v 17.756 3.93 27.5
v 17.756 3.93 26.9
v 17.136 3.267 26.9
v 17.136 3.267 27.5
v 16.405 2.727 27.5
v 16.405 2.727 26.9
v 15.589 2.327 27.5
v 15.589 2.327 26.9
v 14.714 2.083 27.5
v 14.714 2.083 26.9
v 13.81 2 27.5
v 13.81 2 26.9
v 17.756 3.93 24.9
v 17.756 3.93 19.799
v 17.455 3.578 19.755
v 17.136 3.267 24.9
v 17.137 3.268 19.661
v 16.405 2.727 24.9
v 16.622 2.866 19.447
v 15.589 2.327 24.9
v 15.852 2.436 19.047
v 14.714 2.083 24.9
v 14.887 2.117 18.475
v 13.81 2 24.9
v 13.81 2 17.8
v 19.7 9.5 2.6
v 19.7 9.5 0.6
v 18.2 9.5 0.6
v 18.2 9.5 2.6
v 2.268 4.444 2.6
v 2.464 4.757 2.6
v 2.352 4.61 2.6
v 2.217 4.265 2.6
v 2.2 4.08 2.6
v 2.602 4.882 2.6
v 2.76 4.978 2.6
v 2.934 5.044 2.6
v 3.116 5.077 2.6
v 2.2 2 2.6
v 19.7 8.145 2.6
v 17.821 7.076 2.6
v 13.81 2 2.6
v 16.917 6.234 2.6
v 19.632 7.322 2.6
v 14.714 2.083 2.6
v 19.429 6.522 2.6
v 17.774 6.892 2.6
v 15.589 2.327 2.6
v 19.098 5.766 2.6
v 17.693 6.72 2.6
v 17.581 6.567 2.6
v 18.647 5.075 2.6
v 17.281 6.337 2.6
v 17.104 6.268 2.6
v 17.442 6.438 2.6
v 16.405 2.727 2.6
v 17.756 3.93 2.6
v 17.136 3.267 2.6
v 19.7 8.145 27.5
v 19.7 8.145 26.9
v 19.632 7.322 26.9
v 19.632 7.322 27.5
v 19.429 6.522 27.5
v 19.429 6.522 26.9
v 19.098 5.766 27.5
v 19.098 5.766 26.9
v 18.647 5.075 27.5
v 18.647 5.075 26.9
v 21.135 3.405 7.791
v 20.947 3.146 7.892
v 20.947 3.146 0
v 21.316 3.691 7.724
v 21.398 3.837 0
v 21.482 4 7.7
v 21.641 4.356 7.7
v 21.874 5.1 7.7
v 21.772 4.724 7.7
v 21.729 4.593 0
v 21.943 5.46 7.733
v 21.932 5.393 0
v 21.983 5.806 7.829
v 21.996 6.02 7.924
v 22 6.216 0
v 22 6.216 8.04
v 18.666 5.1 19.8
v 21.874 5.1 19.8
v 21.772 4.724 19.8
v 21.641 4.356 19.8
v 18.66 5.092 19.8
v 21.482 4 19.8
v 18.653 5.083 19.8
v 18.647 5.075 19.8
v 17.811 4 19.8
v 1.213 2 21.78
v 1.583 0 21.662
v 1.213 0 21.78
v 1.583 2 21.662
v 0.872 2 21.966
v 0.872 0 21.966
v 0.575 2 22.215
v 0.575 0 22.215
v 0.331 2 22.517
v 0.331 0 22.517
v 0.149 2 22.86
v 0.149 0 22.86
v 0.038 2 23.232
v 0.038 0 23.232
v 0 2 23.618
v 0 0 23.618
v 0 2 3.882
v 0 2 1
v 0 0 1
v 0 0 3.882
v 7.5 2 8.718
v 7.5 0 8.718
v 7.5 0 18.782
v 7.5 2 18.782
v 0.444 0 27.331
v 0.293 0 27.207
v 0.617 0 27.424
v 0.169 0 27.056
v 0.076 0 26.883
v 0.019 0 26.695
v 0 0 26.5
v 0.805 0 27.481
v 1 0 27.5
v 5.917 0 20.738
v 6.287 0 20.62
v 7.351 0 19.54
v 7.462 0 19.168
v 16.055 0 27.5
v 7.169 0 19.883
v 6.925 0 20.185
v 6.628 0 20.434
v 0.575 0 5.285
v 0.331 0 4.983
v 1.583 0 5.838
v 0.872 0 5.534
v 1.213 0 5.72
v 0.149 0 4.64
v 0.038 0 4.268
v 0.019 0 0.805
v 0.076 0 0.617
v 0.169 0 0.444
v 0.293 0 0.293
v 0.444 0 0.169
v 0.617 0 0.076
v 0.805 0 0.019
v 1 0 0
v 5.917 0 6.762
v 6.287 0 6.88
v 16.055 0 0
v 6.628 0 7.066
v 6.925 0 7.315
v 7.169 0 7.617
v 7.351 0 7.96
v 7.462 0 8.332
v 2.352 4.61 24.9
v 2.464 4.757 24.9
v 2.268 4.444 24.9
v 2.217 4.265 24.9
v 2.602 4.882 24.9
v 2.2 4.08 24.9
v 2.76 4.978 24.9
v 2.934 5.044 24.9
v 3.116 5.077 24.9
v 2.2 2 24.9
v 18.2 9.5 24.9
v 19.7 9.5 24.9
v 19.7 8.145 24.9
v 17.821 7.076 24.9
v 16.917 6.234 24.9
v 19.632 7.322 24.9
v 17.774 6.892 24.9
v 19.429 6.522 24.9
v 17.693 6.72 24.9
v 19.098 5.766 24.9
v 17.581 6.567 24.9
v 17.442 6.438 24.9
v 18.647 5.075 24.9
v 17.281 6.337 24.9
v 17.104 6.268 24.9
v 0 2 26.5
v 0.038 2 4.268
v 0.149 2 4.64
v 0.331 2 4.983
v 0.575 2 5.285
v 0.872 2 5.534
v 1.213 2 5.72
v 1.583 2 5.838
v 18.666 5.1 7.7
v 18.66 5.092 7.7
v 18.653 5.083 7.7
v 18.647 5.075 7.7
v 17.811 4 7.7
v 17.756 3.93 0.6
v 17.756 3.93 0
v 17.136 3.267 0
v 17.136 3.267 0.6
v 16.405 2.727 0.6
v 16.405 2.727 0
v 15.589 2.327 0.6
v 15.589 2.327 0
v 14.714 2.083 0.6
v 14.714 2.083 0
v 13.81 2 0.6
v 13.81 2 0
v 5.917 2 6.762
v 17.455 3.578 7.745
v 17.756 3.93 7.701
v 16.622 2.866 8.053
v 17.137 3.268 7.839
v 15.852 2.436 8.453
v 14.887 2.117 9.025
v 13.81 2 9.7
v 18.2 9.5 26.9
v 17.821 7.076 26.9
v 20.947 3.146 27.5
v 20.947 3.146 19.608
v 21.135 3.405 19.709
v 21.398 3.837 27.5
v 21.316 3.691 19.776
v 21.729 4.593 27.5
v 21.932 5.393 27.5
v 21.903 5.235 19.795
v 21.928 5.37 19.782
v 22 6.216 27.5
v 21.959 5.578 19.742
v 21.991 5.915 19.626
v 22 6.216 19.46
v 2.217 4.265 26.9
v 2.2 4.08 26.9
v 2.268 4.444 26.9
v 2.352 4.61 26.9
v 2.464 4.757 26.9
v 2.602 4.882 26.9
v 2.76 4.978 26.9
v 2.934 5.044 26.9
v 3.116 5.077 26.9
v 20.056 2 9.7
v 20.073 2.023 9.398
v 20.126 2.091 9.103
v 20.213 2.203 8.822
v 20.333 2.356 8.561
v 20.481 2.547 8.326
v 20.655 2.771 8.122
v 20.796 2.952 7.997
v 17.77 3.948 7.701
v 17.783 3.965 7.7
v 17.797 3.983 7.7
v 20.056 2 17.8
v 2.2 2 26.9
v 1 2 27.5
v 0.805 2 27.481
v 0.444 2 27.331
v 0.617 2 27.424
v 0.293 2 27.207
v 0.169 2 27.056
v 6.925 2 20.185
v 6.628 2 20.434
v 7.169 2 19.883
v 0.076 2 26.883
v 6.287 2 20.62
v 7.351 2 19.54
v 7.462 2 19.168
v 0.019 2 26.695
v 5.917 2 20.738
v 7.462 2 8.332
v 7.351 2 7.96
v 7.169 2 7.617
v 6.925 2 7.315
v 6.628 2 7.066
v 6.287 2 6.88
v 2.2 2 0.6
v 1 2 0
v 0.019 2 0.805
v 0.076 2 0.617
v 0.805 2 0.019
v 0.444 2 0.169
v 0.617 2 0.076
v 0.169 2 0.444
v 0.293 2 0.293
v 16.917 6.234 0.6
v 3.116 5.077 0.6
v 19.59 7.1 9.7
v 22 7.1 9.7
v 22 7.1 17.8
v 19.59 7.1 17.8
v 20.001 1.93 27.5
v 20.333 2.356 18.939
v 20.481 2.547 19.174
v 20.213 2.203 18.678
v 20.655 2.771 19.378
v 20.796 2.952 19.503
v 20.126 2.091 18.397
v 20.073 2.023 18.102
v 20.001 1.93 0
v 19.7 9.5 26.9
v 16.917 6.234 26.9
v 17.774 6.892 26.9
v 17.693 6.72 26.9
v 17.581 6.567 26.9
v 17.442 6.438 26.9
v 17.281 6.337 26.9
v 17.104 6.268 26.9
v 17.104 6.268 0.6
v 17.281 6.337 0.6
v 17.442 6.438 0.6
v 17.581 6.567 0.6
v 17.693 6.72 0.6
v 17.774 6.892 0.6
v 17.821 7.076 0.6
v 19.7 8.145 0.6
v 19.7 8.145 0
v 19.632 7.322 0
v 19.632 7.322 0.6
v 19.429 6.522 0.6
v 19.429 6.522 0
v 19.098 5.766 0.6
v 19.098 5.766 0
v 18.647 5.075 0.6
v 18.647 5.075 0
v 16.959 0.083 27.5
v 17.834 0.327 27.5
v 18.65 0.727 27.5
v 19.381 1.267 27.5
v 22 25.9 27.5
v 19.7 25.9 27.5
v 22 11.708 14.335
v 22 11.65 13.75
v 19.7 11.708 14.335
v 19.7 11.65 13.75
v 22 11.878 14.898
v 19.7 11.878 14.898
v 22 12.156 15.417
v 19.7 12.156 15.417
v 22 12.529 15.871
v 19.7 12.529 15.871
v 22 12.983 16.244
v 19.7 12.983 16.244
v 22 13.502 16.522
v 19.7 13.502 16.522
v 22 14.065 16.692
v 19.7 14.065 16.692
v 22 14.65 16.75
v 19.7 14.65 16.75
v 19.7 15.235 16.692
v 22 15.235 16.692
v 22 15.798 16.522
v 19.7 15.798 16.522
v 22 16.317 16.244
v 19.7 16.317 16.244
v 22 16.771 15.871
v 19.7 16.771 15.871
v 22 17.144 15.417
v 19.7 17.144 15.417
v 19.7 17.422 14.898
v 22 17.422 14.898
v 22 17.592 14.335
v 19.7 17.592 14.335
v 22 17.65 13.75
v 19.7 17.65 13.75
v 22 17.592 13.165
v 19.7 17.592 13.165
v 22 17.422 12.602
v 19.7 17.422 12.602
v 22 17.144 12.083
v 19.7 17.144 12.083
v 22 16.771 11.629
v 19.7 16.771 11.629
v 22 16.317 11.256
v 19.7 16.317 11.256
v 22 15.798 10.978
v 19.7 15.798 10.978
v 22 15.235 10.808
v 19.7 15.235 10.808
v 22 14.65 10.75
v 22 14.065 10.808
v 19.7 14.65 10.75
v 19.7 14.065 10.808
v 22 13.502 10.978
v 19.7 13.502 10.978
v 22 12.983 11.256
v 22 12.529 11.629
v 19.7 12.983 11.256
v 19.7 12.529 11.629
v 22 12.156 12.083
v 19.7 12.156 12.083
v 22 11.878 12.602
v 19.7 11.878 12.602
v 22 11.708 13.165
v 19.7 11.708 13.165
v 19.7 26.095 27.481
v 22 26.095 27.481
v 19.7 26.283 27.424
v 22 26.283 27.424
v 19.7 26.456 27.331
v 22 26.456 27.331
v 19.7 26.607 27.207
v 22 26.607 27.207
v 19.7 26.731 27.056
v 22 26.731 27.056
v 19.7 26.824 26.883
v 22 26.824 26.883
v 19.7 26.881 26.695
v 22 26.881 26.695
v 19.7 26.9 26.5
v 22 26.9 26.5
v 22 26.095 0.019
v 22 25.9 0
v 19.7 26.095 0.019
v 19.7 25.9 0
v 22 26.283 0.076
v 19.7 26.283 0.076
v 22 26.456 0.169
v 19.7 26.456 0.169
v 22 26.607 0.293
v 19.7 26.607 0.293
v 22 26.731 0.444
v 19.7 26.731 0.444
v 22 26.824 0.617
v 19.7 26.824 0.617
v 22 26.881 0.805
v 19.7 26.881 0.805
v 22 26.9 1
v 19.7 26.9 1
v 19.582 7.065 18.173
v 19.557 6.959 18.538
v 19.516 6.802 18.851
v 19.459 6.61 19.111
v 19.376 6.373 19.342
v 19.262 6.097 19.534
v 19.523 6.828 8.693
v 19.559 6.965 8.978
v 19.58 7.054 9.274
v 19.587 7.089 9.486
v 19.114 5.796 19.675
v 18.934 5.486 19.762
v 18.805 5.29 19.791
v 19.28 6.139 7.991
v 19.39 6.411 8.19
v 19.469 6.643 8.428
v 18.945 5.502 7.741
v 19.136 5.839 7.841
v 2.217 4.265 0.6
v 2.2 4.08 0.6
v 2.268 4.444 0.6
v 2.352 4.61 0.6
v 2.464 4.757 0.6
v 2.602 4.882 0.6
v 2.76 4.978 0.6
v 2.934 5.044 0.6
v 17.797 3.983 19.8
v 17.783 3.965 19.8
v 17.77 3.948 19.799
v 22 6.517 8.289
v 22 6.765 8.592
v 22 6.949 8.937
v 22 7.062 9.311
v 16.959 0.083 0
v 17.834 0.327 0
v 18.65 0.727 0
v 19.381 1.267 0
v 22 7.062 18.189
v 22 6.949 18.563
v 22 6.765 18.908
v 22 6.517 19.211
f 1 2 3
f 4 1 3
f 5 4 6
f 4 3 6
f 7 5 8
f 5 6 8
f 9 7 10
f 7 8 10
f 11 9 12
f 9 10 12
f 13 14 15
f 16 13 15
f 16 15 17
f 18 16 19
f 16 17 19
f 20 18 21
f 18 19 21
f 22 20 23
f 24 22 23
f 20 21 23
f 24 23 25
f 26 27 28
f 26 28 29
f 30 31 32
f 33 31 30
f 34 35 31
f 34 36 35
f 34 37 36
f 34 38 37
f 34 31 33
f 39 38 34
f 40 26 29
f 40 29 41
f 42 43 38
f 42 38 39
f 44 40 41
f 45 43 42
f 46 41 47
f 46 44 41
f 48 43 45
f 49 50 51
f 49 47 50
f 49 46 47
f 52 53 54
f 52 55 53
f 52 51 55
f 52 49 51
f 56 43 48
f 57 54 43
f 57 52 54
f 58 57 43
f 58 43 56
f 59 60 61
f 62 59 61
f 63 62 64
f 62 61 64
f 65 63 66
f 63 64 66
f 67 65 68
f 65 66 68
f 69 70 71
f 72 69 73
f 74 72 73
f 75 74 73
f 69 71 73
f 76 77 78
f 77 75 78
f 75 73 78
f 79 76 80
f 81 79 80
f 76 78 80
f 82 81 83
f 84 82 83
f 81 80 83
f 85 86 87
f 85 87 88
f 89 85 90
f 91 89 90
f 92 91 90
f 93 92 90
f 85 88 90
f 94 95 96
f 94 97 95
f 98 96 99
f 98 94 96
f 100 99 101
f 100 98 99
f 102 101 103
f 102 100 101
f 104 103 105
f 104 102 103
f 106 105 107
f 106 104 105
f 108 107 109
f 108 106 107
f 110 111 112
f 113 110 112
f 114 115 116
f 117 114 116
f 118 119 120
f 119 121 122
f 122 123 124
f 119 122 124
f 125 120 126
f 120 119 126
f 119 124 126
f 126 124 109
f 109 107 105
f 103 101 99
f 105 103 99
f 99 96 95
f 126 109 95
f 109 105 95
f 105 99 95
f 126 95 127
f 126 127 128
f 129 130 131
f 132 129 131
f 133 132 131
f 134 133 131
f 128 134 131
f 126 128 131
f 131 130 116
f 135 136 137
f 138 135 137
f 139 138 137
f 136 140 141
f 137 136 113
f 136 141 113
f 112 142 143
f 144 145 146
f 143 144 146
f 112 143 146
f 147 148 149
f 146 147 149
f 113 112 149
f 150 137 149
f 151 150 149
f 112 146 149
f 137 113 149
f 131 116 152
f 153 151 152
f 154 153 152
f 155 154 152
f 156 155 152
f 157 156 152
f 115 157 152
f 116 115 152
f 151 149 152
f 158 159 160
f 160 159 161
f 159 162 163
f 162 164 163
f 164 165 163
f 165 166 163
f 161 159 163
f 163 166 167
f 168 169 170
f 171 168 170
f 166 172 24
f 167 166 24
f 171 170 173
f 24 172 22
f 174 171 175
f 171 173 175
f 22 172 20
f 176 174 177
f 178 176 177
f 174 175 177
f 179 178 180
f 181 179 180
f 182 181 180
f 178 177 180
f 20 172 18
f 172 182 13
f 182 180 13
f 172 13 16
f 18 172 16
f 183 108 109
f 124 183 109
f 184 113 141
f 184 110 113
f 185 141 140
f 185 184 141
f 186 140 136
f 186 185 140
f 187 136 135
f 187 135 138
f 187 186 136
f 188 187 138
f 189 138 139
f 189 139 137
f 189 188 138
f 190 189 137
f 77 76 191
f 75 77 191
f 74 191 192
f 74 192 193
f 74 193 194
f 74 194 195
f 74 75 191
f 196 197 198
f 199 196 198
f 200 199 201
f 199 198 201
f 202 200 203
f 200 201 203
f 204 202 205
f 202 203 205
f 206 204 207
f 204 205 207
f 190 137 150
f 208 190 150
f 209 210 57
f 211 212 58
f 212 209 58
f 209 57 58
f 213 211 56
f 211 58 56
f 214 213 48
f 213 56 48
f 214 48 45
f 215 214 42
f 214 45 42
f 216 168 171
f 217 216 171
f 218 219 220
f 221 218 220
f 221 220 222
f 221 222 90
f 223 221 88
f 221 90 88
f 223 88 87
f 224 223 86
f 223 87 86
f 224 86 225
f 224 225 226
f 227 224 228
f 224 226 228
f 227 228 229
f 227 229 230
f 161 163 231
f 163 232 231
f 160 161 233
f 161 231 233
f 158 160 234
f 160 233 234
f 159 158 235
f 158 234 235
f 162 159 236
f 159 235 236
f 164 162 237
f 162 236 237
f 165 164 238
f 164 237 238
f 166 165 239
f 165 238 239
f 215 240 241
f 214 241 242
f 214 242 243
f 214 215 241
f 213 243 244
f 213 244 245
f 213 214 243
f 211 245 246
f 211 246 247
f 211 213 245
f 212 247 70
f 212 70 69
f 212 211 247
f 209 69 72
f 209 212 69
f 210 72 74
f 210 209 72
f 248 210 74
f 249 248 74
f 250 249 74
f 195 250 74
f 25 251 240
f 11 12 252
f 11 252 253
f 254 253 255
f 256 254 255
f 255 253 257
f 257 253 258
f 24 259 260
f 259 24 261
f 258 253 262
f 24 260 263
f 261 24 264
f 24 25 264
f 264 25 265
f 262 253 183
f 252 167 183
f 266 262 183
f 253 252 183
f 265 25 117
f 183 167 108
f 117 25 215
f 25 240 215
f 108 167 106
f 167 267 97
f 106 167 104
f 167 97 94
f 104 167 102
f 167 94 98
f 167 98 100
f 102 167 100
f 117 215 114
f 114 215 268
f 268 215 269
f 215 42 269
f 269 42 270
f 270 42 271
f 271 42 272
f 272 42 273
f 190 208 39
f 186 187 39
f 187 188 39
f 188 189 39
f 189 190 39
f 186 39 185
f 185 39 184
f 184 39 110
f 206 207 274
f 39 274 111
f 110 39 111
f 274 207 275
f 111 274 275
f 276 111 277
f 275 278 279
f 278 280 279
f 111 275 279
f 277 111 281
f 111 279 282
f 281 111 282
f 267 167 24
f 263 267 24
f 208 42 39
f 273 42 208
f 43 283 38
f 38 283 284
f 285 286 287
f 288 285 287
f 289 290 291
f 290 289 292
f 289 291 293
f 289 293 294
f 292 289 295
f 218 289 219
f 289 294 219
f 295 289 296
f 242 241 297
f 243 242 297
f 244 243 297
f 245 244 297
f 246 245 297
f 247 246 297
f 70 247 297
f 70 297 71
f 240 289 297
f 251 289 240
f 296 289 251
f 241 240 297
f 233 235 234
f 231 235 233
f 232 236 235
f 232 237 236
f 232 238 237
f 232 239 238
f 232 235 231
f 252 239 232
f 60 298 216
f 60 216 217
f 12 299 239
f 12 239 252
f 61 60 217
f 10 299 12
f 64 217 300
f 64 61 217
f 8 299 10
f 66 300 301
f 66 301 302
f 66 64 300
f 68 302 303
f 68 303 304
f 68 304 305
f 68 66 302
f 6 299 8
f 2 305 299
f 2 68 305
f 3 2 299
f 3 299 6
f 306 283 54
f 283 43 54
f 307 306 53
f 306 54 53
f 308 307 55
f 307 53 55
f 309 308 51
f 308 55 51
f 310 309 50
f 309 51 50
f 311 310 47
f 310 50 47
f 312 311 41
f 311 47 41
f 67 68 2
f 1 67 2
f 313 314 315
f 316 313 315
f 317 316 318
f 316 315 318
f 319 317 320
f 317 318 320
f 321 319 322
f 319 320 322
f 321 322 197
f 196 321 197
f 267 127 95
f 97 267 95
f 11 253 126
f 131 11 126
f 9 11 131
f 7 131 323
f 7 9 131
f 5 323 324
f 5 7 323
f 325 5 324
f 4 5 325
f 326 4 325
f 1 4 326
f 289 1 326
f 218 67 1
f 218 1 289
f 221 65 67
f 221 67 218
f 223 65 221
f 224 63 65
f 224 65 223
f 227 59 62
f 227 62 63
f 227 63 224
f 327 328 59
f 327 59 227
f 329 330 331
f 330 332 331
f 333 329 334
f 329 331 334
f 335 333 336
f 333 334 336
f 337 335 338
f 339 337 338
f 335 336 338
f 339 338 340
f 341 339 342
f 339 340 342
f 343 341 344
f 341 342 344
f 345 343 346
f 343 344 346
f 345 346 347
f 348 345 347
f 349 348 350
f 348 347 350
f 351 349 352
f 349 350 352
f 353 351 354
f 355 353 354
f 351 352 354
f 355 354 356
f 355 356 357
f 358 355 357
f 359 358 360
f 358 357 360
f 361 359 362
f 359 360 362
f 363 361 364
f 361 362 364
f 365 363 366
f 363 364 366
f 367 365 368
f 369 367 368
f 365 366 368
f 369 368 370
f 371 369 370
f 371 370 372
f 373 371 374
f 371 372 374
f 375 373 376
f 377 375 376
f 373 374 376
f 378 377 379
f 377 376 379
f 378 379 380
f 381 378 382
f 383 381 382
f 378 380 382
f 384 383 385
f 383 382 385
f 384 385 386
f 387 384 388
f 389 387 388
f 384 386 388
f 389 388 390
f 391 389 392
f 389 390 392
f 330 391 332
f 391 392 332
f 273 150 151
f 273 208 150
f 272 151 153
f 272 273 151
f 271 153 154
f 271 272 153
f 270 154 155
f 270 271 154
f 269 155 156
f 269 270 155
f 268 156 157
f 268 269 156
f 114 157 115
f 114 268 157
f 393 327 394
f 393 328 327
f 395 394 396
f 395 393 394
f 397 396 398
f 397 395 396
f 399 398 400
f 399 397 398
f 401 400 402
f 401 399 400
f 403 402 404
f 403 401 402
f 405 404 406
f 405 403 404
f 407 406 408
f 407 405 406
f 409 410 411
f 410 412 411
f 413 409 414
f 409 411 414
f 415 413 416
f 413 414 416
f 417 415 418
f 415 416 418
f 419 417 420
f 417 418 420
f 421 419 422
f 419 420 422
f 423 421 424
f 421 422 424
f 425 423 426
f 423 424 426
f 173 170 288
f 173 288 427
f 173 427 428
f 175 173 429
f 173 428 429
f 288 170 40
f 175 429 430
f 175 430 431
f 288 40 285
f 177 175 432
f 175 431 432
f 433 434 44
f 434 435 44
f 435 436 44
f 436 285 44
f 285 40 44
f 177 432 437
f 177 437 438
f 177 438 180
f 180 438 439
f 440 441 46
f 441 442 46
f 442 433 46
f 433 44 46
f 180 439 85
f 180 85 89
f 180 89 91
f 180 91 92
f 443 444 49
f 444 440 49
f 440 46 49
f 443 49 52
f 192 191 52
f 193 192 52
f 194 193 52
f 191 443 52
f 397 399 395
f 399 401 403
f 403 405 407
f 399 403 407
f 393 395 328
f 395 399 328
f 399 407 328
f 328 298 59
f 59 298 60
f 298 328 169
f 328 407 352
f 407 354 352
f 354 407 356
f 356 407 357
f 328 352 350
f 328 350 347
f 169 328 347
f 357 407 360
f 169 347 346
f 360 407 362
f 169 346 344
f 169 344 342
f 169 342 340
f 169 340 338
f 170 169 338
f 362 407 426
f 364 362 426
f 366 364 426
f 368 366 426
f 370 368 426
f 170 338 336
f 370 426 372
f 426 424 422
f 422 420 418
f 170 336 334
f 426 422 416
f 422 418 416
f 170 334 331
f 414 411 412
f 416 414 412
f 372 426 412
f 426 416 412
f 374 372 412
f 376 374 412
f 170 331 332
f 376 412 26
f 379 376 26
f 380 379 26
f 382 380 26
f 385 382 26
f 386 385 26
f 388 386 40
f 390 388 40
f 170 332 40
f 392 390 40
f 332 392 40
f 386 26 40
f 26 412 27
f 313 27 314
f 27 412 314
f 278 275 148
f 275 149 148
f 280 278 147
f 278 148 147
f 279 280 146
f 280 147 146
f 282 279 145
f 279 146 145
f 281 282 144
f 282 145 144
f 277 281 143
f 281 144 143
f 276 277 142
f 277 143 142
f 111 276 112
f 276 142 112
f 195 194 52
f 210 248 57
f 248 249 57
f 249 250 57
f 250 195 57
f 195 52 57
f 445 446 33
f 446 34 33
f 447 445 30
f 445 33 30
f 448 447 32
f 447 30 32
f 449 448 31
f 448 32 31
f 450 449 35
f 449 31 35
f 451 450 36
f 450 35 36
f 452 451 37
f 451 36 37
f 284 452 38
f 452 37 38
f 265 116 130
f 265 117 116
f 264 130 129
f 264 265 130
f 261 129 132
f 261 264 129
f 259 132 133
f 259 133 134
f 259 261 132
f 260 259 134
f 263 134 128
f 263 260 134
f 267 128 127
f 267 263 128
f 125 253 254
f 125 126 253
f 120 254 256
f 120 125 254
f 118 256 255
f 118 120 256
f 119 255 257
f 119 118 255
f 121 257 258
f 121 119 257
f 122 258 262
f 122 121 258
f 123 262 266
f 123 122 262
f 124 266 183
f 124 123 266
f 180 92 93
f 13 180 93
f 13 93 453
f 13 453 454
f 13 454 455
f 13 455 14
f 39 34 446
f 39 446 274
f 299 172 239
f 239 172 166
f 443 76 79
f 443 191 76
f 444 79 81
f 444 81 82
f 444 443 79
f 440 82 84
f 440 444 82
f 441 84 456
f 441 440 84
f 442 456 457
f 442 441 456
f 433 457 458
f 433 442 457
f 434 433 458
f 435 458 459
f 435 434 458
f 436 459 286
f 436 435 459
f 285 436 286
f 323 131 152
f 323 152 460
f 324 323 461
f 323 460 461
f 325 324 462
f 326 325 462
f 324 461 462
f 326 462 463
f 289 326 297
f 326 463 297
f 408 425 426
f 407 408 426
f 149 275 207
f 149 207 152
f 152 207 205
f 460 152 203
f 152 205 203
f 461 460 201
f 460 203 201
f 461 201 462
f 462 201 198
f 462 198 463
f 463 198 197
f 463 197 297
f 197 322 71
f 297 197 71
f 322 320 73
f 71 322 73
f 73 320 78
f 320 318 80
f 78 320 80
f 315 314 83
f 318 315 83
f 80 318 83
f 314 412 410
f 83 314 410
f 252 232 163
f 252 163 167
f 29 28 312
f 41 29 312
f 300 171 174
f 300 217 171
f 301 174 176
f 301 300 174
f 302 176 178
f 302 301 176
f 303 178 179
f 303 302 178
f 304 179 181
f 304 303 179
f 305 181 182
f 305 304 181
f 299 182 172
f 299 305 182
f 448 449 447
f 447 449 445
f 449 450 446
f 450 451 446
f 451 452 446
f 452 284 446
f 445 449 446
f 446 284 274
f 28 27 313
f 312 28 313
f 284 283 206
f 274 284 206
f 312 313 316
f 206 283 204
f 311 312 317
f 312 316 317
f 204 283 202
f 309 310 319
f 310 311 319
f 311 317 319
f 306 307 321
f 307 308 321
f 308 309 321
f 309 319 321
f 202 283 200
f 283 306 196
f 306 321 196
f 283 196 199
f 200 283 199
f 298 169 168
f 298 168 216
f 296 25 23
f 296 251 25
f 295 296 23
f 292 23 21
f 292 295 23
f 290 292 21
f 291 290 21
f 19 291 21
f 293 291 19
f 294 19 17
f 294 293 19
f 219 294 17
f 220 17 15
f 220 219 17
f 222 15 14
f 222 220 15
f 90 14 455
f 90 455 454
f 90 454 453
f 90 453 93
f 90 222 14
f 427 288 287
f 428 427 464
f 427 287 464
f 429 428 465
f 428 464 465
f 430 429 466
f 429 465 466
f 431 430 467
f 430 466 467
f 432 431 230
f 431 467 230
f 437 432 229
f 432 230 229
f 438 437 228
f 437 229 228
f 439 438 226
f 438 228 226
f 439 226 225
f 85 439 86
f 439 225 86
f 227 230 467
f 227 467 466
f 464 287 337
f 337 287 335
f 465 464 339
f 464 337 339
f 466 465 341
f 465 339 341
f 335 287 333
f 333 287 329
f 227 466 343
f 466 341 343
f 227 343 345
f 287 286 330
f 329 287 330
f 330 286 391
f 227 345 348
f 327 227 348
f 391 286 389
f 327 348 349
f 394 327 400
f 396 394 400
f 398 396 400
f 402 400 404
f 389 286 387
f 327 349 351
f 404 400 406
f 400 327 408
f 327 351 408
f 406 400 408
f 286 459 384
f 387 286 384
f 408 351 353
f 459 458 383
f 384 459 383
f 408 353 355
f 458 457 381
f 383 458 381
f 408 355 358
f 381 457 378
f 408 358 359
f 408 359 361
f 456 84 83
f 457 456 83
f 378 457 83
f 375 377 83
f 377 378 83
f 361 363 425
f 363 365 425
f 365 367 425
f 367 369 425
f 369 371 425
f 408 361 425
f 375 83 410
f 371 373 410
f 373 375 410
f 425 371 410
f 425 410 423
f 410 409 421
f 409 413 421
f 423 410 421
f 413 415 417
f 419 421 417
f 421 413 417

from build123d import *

# Parameters (mm, degrees)
F1_DEPTH  = 27.5
F2_W      = 5.1
F2_H      = 12.1
F2_R      = 3
F3_DEPTH  = 12.5
F4_W      = 7.5
F4_H      = 2
F5_DEPTH  = 17.5
F7_DEPTH  = 26.901
F8_R      = 1
F9_R      = 2
F11_DEPTH = 26.901
F12_R     = 2


with BuildPart() as f1:
    # F0 (on Top) → F1 (new body)
    with BuildSketch(Plane.XY):
        with BuildLine():
            Line((0, 2), (0, 0))
            Line((0, 0), (16.0545809717, 0))
            ThreePointArc((16.0545809717, 0), (18.2513382025, 0.5084236989), (20.0013420586, 1.9302969324))
            Line((20.0013420586, 1.9302969324), (20.9467610869, 3.1458356831))
            ThreePointArc((20.9467610869, 3.1458356831), (21.7293659953, 4.5928566245), (22, 6.2155387507))
            Line((22, 6.2155387507), (22, 26.9))
            Line((22, 26.9), (19.7, 26.9))
            Line((19.7, 26.9), (19.7, 8.1448620011))
            ThreePointArc((19.7, 8.1448620011), (19.4293659953, 6.5221798749), (18.6467610869, 5.0751589336))
            Line((18.6467610869, 5.0751589336), (17.7563128638, 3.9302969324))
            ThreePointArc((17.7563128638, 3.9302969324), (16.0063090077, 2.5084236989), (13.8095517769, 2))
            Line((13.8095517769, 2), (0, 2))
        make_face()
    extrude(amount=F1_DEPTH)

    # F2 (on face) → F3 (cut, symmetric)
    with BuildSketch(Plane(origin=(19.7, 0, 0), x_dir=(0, -1, 0), z_dir=(-1, 0, 0))):
        with Locations((-4.55, 13.75)):
            Rectangle(F2_W, F2_H)
        with Locations((-14.65, 13.75)):
            Circle(F2_R)
    extrude(amount=F3_DEPTH, both=True, mode=Mode.SUBTRACT)

    # F4 (on face) → F5 (join)
    with BuildSketch(Plane(origin=(19.7, 0, 0), x_dir=(0, -1, 0), z_dir=(-1, 0, 0))):
        with Locations((-5.75, 25.9)):
            Rectangle(F4_W, F4_H)
        with Locations((-5.75, 1.6)):
            Rectangle(F4_W, F4_H)
    extrude(amount=F5_DEPTH)

    # F6 (on face) → F7 (cut, through all)
    with BuildSketch(Plane(origin=(0, 0, 0.6), x_dir=(1, 0, 0), z_dir=(0, 0, -1))):
        Polygon((17.7, -6.3), (2.2, -5), (2.2, -9.5), (18.2, -9.5), align=None)
    extrude(amount=-F7_DEPTH, mode=Mode.SUBTRACT)

    # F8
    f8_edges = [f1.edges().sort_by_distance(p)[0] for p in [
        (2.2, 5, 1.6),
        (2.2, 5, 25.9),
        (0, 1, 0),
        (0, 1, 27.5),
        (20.85, 26.9, 0),
        (20.85, 26.9, 27.5),
        (17.7, 6.3, 1.6),
        (17.7, 6.3, 25.9),
    ]]
    fillet(f8_edges, radius=F8_R)

    # F9
    f9_edges = [f1.edges().sort_by_distance(p)[0] for p in [
        (16.932554, 2, 19.8),
        (20.794804, 7.1, 19.8),
        (16.932554, 2, 7.7),
        (20.794804, 7.1, 7.7),
    ]]
    fillet(f9_edges, radius=F9_R)

    # F10 (on face) → F11 (cut, through all)
    with BuildSketch(Plane.XZ):
        Polygon((0, 22), (0, 5.5), (7.5, 7.1), (7.5, 20.4), align=None)
    extrude(amount=-F11_DEPTH, mode=Mode.SUBTRACT)

    # F12
    f12_edges = [f1.edges().sort_by_distance(p)[0] for p in [
        (0, 1, 5.5),
        (0, 1, 22),
        (7.5, 1, 20.4),
        (7.5, 1, 7.1),
    ]]
    fillet(f12_edges, radius=F12_R)


solid = f1.part
